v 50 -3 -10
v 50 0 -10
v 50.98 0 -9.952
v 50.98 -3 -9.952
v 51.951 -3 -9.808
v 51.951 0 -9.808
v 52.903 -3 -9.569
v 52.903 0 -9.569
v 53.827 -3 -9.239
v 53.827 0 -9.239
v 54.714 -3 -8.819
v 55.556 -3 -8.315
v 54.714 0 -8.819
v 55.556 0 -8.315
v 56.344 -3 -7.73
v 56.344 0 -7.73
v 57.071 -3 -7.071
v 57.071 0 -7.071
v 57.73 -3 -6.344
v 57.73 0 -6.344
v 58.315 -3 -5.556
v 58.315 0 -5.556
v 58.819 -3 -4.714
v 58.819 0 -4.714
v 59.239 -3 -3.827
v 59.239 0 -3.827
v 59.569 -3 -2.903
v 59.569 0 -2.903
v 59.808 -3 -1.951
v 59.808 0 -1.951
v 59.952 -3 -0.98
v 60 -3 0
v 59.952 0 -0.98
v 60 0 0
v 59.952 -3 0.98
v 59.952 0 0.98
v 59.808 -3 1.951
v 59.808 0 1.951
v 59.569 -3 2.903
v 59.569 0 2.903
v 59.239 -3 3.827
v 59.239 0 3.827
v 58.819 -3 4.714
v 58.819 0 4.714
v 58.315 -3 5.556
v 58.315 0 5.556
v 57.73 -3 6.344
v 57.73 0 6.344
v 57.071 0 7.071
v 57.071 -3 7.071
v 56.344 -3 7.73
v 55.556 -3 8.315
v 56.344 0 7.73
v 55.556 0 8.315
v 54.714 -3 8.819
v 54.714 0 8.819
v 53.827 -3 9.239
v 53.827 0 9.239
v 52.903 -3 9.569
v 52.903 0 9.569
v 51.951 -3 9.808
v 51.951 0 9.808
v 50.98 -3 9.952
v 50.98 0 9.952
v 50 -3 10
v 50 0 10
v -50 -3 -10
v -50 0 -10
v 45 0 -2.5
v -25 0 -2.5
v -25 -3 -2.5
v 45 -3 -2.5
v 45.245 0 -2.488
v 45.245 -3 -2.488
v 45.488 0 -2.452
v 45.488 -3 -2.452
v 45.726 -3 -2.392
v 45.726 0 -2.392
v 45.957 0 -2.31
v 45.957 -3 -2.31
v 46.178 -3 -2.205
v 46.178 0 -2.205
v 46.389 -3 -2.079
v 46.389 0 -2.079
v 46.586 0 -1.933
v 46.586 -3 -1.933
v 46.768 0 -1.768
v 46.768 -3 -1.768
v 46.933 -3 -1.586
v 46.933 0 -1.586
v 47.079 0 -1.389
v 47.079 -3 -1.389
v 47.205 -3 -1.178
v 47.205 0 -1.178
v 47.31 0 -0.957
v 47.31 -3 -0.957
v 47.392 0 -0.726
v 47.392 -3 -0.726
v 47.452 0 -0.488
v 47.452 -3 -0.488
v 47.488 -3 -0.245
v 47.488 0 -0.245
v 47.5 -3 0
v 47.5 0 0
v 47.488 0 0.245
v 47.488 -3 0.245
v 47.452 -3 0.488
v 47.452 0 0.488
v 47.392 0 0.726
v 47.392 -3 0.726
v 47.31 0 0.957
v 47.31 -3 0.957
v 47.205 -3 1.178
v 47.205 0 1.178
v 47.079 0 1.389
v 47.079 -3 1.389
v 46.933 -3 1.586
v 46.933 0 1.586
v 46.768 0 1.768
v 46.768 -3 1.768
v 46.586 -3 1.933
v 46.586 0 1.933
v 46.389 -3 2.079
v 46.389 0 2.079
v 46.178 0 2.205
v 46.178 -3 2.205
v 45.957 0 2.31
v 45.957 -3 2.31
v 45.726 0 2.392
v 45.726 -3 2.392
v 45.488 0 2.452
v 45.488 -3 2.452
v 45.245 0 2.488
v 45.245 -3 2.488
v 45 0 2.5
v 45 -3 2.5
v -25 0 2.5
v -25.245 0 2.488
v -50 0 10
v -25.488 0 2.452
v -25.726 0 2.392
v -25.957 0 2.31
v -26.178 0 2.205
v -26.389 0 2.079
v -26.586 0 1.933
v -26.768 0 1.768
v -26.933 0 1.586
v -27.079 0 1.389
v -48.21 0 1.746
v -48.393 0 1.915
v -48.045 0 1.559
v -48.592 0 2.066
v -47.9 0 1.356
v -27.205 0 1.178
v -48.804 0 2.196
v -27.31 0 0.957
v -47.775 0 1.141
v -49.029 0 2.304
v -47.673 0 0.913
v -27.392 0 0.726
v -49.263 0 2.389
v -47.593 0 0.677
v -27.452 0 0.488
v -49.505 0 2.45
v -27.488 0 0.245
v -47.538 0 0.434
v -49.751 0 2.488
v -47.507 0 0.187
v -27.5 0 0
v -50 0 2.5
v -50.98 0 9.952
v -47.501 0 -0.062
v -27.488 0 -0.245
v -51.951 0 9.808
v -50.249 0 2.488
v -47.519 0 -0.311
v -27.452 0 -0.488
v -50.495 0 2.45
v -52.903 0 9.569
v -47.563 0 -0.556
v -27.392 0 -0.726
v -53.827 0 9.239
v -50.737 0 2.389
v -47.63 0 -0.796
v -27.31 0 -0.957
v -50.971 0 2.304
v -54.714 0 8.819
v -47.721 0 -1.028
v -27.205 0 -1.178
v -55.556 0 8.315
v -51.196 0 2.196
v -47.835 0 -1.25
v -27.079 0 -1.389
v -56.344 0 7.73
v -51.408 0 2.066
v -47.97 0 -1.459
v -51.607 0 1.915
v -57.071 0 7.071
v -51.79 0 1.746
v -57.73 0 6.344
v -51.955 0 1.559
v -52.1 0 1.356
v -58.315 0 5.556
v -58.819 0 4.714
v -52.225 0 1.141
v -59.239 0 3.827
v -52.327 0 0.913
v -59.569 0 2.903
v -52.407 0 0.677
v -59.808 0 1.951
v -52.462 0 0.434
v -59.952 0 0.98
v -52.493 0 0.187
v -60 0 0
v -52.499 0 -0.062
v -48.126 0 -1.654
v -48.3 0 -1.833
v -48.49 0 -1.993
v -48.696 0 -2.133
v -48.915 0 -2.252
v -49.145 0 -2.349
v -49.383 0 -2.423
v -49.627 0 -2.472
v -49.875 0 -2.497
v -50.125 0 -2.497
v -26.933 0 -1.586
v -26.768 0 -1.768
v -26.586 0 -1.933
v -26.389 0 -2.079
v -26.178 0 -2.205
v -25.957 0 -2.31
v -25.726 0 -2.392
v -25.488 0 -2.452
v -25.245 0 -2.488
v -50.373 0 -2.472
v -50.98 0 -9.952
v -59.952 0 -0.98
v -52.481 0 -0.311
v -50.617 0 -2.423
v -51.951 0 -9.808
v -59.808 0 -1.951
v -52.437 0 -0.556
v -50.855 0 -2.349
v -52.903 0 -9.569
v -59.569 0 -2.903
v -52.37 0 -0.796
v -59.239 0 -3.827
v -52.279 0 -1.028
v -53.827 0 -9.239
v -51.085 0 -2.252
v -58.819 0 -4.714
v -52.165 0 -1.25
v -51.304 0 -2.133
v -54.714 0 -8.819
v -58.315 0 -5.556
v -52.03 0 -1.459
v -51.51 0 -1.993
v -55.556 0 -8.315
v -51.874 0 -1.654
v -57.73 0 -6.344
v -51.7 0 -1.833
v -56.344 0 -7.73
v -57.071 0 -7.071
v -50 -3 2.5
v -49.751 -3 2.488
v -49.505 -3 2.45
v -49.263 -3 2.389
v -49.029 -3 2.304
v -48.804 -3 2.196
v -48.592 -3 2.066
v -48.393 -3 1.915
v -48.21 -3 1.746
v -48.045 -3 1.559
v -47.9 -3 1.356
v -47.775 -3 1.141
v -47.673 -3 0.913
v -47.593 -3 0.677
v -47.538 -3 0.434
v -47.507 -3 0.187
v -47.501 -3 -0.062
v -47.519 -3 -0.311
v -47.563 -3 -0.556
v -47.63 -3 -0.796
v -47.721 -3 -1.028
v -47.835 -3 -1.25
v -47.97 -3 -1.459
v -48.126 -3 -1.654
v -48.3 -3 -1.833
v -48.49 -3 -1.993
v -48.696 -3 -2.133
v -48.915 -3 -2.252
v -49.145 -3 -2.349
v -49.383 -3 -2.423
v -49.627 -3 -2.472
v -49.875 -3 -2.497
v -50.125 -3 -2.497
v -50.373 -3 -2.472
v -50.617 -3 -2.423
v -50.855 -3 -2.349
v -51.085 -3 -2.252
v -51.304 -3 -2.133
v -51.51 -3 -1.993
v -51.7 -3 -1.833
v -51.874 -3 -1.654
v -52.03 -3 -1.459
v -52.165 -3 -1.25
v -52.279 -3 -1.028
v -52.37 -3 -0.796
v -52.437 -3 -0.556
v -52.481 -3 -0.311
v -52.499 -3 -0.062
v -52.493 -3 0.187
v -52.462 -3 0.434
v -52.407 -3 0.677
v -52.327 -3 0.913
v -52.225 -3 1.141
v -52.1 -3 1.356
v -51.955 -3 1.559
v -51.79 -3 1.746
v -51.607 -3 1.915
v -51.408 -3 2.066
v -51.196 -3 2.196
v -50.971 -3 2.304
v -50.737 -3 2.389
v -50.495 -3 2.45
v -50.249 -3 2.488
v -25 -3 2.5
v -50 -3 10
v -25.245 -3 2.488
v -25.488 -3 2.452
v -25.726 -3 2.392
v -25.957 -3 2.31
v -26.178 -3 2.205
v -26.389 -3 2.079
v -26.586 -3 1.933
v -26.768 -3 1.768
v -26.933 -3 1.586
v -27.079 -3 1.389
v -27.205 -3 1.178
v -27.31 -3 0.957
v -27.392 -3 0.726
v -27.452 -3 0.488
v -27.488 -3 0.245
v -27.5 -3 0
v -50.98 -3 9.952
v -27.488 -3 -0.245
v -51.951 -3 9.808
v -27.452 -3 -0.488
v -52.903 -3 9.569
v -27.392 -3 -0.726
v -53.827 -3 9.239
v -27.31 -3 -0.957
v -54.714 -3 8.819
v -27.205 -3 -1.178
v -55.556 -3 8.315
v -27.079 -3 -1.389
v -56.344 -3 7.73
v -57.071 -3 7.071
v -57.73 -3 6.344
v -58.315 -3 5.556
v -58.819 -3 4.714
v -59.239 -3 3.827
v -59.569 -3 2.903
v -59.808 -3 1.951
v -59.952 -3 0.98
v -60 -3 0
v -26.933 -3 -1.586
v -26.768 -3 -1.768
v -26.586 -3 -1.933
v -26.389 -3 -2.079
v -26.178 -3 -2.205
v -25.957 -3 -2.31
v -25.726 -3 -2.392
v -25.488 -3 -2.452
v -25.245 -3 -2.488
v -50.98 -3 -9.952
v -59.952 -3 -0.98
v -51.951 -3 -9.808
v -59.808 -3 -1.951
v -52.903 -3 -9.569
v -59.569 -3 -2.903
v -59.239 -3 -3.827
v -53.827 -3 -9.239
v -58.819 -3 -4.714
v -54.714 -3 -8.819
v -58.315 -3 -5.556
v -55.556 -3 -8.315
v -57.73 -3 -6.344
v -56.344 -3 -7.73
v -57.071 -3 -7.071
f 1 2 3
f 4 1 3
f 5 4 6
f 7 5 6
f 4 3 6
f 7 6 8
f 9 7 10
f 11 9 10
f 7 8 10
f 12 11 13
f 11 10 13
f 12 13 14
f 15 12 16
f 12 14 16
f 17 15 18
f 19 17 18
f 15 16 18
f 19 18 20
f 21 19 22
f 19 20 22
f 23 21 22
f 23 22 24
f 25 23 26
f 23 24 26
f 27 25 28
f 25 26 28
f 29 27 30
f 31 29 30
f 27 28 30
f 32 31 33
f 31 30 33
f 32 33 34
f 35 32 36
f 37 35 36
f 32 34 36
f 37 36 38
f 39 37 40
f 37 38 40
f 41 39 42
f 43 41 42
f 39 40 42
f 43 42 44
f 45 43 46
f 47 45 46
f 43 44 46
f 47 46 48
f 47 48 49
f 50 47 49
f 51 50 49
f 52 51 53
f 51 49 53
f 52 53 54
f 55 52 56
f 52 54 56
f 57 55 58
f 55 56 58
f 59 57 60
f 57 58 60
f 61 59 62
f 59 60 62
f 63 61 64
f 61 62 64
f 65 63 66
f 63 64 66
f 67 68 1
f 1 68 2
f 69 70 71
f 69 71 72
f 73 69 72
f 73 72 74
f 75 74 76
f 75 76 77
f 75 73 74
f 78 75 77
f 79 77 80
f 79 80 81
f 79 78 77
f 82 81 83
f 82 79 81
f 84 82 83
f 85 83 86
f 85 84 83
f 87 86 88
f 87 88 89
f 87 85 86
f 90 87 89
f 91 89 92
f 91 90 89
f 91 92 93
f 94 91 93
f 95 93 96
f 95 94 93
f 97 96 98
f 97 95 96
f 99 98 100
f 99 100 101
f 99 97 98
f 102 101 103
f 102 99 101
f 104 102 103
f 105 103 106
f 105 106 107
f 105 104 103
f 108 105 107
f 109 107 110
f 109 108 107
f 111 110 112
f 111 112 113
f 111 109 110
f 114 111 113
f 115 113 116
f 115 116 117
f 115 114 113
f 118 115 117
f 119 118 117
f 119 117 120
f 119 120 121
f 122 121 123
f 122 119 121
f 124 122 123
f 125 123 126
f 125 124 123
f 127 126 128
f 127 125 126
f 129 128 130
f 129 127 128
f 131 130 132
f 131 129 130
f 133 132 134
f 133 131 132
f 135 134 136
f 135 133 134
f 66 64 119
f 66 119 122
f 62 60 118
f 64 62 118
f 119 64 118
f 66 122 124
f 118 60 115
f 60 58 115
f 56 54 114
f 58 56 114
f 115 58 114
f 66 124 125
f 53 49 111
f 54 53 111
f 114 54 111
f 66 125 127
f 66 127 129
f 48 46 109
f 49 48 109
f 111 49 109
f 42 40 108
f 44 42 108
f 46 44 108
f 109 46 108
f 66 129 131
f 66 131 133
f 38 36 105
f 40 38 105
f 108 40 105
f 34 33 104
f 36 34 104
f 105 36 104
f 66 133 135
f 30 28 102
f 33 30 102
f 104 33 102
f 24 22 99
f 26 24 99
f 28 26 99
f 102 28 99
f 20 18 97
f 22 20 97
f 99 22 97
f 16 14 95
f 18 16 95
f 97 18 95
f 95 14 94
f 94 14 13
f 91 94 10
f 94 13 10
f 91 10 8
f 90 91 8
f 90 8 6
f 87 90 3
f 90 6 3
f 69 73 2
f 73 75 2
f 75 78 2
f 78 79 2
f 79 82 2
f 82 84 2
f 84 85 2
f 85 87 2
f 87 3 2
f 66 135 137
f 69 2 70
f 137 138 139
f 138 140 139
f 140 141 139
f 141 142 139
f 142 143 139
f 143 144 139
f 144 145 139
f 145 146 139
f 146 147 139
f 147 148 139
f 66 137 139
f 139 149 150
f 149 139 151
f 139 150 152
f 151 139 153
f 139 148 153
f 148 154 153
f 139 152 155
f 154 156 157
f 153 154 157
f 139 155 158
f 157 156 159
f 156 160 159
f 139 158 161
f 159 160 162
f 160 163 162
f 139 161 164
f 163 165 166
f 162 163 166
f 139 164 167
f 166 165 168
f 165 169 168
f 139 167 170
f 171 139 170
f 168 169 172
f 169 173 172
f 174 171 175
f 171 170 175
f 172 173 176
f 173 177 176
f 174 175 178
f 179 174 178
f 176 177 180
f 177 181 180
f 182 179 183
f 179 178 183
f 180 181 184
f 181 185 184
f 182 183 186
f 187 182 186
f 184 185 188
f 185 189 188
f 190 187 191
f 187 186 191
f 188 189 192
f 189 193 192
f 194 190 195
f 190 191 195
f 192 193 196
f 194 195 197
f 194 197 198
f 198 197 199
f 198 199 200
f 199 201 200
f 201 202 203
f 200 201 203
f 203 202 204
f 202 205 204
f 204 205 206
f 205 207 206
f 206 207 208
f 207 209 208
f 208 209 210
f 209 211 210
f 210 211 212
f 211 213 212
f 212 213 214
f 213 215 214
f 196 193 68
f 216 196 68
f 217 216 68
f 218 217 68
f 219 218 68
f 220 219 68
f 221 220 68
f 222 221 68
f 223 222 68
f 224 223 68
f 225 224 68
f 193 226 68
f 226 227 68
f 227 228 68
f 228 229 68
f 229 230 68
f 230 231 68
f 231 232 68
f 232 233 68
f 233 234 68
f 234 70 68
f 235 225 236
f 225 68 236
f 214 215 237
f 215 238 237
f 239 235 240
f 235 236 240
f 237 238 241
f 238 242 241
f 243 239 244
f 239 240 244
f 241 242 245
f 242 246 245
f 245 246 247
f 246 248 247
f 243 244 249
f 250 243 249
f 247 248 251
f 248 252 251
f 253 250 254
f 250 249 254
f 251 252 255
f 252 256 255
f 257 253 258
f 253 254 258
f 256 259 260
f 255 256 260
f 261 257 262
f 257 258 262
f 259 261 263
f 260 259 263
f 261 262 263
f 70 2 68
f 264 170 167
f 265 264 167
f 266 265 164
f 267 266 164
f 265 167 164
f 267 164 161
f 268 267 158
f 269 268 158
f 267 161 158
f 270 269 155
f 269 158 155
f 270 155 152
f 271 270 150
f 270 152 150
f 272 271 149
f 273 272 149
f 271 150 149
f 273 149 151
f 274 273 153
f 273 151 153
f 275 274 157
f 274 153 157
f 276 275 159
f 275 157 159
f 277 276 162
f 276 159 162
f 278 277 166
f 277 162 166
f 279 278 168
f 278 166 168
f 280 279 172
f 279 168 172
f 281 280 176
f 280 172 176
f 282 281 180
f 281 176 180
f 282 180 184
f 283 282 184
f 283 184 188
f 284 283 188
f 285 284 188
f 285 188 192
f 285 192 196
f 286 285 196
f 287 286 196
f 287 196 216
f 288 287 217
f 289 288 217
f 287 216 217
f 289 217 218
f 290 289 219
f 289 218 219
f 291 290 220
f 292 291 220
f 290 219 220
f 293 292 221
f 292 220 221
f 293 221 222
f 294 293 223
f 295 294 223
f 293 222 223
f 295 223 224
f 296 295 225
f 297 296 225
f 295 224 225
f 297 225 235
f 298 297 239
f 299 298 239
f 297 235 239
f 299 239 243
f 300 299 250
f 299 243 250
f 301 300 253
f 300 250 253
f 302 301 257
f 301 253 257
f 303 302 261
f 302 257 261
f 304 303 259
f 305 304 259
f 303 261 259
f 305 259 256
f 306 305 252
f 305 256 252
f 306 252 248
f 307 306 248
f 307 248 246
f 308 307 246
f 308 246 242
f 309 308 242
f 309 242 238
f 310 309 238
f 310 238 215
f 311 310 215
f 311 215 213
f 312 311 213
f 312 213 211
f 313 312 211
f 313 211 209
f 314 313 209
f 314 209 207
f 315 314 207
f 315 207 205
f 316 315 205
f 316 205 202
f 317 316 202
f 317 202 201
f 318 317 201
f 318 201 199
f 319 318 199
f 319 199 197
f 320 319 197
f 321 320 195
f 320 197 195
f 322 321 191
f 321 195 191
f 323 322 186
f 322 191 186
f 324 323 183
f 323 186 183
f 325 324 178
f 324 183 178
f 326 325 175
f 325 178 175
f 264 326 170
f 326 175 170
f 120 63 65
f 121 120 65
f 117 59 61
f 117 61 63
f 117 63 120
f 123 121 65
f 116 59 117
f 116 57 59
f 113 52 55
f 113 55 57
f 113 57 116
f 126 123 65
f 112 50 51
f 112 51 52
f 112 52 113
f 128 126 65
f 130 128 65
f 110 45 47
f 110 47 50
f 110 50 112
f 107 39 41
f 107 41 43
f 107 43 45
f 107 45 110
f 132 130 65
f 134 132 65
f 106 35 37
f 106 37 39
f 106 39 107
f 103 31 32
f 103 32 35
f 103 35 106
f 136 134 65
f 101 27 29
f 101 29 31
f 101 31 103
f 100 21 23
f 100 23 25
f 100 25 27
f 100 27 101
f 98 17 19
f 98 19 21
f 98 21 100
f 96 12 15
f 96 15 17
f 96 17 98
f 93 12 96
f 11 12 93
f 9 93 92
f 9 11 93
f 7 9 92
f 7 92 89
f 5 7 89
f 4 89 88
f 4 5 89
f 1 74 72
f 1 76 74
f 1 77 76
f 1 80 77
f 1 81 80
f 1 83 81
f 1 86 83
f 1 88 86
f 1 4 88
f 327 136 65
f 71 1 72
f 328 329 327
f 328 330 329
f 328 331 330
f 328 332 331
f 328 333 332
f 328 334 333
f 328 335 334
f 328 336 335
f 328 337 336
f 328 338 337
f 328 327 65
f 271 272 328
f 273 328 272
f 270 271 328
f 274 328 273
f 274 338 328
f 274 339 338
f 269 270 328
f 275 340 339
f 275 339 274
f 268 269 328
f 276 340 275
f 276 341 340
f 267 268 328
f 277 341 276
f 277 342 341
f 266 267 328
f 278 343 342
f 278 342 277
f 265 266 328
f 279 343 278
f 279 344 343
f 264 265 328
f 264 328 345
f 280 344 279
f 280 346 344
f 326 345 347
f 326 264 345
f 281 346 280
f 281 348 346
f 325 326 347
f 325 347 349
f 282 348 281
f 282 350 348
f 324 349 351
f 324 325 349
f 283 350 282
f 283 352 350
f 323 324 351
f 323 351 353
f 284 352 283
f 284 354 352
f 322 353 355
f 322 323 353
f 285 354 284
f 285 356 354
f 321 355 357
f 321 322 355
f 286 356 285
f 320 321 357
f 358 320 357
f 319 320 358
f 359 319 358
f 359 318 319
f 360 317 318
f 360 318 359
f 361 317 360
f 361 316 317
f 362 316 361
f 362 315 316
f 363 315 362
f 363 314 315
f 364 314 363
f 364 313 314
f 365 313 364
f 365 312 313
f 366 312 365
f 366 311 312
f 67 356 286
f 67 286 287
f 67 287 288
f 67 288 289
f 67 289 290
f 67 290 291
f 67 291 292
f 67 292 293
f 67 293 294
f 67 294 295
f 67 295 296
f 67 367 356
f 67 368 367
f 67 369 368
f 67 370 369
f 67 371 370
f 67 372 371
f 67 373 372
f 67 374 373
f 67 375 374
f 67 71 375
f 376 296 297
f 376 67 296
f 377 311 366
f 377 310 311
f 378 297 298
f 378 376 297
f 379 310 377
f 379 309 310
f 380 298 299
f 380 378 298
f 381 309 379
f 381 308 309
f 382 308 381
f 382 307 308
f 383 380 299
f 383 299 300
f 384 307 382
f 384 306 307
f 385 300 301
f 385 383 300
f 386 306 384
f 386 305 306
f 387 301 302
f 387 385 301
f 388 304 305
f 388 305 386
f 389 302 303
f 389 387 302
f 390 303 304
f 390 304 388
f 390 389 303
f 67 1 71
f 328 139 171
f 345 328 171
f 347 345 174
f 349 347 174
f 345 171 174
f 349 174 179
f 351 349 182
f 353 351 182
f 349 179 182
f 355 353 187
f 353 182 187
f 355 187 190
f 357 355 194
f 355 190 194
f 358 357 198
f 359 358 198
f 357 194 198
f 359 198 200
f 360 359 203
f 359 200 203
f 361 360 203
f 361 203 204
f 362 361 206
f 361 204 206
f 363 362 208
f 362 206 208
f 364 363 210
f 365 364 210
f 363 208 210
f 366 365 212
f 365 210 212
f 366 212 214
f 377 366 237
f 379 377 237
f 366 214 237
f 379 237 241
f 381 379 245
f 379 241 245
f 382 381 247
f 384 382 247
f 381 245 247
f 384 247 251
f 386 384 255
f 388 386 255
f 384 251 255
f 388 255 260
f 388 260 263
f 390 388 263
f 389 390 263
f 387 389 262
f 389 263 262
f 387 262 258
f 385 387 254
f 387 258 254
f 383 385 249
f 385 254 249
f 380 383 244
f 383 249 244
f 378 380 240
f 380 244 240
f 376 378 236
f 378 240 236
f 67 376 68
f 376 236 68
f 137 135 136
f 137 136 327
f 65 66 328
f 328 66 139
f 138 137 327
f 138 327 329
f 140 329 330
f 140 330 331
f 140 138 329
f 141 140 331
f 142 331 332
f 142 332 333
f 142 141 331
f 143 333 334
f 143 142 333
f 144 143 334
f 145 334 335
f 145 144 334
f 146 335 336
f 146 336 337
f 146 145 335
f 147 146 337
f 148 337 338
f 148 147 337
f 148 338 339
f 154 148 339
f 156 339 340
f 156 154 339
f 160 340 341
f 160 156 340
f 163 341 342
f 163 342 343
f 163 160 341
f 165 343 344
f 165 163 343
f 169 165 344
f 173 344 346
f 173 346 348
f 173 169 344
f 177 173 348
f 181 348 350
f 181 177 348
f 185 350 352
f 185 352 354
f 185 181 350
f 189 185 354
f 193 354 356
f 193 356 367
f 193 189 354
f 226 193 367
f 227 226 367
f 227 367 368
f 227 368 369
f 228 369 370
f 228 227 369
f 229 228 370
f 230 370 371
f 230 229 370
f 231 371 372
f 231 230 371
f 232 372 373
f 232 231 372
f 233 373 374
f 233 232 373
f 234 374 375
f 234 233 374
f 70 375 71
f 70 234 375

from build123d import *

# Parameters (mm, degrees)
SKETCH1_R          = 2.5
BASE_FLANGE1_DEPTH = 3


# Sheet-metal steps are written as plain solids
with BuildPart() as part:
    # Sketch1 → Base-Flange1 (new body)
    with BuildSketch(Plane(origin=(0, 0, 0), x_dir=(1, 0, 0), z_dir=(0, 1, 0))):
        with BuildLine():
            Line((-50, 10), (50, 10))
            ThreePointArc((50, 10), (60, 0), (50, -10))
            Line((50, -10), (-50, -10))
            ThreePointArc((-50, -10), (-60, 0), (-50, 10))
        make_face()
        with Locations(Location((-50, 0, 0), (0, 0, 270))):
            Circle(SKETCH1_R, mode=Mode.SUBTRACT)
        with BuildLine():
            Line((-25, 2.5), (45, 2.5))
            ThreePointArc((45, 2.5), (47.5, 0), (45, -2.5))
            Line((45, -2.5), (-25, -2.5))
            ThreePointArc((-25, -2.5), (-27.5, 0), (-25, 2.5))
        make_face(mode=Mode.SUBTRACT)
    extrude(amount=-BASE_FLANGE1_DEPTH)


solid = part.part
